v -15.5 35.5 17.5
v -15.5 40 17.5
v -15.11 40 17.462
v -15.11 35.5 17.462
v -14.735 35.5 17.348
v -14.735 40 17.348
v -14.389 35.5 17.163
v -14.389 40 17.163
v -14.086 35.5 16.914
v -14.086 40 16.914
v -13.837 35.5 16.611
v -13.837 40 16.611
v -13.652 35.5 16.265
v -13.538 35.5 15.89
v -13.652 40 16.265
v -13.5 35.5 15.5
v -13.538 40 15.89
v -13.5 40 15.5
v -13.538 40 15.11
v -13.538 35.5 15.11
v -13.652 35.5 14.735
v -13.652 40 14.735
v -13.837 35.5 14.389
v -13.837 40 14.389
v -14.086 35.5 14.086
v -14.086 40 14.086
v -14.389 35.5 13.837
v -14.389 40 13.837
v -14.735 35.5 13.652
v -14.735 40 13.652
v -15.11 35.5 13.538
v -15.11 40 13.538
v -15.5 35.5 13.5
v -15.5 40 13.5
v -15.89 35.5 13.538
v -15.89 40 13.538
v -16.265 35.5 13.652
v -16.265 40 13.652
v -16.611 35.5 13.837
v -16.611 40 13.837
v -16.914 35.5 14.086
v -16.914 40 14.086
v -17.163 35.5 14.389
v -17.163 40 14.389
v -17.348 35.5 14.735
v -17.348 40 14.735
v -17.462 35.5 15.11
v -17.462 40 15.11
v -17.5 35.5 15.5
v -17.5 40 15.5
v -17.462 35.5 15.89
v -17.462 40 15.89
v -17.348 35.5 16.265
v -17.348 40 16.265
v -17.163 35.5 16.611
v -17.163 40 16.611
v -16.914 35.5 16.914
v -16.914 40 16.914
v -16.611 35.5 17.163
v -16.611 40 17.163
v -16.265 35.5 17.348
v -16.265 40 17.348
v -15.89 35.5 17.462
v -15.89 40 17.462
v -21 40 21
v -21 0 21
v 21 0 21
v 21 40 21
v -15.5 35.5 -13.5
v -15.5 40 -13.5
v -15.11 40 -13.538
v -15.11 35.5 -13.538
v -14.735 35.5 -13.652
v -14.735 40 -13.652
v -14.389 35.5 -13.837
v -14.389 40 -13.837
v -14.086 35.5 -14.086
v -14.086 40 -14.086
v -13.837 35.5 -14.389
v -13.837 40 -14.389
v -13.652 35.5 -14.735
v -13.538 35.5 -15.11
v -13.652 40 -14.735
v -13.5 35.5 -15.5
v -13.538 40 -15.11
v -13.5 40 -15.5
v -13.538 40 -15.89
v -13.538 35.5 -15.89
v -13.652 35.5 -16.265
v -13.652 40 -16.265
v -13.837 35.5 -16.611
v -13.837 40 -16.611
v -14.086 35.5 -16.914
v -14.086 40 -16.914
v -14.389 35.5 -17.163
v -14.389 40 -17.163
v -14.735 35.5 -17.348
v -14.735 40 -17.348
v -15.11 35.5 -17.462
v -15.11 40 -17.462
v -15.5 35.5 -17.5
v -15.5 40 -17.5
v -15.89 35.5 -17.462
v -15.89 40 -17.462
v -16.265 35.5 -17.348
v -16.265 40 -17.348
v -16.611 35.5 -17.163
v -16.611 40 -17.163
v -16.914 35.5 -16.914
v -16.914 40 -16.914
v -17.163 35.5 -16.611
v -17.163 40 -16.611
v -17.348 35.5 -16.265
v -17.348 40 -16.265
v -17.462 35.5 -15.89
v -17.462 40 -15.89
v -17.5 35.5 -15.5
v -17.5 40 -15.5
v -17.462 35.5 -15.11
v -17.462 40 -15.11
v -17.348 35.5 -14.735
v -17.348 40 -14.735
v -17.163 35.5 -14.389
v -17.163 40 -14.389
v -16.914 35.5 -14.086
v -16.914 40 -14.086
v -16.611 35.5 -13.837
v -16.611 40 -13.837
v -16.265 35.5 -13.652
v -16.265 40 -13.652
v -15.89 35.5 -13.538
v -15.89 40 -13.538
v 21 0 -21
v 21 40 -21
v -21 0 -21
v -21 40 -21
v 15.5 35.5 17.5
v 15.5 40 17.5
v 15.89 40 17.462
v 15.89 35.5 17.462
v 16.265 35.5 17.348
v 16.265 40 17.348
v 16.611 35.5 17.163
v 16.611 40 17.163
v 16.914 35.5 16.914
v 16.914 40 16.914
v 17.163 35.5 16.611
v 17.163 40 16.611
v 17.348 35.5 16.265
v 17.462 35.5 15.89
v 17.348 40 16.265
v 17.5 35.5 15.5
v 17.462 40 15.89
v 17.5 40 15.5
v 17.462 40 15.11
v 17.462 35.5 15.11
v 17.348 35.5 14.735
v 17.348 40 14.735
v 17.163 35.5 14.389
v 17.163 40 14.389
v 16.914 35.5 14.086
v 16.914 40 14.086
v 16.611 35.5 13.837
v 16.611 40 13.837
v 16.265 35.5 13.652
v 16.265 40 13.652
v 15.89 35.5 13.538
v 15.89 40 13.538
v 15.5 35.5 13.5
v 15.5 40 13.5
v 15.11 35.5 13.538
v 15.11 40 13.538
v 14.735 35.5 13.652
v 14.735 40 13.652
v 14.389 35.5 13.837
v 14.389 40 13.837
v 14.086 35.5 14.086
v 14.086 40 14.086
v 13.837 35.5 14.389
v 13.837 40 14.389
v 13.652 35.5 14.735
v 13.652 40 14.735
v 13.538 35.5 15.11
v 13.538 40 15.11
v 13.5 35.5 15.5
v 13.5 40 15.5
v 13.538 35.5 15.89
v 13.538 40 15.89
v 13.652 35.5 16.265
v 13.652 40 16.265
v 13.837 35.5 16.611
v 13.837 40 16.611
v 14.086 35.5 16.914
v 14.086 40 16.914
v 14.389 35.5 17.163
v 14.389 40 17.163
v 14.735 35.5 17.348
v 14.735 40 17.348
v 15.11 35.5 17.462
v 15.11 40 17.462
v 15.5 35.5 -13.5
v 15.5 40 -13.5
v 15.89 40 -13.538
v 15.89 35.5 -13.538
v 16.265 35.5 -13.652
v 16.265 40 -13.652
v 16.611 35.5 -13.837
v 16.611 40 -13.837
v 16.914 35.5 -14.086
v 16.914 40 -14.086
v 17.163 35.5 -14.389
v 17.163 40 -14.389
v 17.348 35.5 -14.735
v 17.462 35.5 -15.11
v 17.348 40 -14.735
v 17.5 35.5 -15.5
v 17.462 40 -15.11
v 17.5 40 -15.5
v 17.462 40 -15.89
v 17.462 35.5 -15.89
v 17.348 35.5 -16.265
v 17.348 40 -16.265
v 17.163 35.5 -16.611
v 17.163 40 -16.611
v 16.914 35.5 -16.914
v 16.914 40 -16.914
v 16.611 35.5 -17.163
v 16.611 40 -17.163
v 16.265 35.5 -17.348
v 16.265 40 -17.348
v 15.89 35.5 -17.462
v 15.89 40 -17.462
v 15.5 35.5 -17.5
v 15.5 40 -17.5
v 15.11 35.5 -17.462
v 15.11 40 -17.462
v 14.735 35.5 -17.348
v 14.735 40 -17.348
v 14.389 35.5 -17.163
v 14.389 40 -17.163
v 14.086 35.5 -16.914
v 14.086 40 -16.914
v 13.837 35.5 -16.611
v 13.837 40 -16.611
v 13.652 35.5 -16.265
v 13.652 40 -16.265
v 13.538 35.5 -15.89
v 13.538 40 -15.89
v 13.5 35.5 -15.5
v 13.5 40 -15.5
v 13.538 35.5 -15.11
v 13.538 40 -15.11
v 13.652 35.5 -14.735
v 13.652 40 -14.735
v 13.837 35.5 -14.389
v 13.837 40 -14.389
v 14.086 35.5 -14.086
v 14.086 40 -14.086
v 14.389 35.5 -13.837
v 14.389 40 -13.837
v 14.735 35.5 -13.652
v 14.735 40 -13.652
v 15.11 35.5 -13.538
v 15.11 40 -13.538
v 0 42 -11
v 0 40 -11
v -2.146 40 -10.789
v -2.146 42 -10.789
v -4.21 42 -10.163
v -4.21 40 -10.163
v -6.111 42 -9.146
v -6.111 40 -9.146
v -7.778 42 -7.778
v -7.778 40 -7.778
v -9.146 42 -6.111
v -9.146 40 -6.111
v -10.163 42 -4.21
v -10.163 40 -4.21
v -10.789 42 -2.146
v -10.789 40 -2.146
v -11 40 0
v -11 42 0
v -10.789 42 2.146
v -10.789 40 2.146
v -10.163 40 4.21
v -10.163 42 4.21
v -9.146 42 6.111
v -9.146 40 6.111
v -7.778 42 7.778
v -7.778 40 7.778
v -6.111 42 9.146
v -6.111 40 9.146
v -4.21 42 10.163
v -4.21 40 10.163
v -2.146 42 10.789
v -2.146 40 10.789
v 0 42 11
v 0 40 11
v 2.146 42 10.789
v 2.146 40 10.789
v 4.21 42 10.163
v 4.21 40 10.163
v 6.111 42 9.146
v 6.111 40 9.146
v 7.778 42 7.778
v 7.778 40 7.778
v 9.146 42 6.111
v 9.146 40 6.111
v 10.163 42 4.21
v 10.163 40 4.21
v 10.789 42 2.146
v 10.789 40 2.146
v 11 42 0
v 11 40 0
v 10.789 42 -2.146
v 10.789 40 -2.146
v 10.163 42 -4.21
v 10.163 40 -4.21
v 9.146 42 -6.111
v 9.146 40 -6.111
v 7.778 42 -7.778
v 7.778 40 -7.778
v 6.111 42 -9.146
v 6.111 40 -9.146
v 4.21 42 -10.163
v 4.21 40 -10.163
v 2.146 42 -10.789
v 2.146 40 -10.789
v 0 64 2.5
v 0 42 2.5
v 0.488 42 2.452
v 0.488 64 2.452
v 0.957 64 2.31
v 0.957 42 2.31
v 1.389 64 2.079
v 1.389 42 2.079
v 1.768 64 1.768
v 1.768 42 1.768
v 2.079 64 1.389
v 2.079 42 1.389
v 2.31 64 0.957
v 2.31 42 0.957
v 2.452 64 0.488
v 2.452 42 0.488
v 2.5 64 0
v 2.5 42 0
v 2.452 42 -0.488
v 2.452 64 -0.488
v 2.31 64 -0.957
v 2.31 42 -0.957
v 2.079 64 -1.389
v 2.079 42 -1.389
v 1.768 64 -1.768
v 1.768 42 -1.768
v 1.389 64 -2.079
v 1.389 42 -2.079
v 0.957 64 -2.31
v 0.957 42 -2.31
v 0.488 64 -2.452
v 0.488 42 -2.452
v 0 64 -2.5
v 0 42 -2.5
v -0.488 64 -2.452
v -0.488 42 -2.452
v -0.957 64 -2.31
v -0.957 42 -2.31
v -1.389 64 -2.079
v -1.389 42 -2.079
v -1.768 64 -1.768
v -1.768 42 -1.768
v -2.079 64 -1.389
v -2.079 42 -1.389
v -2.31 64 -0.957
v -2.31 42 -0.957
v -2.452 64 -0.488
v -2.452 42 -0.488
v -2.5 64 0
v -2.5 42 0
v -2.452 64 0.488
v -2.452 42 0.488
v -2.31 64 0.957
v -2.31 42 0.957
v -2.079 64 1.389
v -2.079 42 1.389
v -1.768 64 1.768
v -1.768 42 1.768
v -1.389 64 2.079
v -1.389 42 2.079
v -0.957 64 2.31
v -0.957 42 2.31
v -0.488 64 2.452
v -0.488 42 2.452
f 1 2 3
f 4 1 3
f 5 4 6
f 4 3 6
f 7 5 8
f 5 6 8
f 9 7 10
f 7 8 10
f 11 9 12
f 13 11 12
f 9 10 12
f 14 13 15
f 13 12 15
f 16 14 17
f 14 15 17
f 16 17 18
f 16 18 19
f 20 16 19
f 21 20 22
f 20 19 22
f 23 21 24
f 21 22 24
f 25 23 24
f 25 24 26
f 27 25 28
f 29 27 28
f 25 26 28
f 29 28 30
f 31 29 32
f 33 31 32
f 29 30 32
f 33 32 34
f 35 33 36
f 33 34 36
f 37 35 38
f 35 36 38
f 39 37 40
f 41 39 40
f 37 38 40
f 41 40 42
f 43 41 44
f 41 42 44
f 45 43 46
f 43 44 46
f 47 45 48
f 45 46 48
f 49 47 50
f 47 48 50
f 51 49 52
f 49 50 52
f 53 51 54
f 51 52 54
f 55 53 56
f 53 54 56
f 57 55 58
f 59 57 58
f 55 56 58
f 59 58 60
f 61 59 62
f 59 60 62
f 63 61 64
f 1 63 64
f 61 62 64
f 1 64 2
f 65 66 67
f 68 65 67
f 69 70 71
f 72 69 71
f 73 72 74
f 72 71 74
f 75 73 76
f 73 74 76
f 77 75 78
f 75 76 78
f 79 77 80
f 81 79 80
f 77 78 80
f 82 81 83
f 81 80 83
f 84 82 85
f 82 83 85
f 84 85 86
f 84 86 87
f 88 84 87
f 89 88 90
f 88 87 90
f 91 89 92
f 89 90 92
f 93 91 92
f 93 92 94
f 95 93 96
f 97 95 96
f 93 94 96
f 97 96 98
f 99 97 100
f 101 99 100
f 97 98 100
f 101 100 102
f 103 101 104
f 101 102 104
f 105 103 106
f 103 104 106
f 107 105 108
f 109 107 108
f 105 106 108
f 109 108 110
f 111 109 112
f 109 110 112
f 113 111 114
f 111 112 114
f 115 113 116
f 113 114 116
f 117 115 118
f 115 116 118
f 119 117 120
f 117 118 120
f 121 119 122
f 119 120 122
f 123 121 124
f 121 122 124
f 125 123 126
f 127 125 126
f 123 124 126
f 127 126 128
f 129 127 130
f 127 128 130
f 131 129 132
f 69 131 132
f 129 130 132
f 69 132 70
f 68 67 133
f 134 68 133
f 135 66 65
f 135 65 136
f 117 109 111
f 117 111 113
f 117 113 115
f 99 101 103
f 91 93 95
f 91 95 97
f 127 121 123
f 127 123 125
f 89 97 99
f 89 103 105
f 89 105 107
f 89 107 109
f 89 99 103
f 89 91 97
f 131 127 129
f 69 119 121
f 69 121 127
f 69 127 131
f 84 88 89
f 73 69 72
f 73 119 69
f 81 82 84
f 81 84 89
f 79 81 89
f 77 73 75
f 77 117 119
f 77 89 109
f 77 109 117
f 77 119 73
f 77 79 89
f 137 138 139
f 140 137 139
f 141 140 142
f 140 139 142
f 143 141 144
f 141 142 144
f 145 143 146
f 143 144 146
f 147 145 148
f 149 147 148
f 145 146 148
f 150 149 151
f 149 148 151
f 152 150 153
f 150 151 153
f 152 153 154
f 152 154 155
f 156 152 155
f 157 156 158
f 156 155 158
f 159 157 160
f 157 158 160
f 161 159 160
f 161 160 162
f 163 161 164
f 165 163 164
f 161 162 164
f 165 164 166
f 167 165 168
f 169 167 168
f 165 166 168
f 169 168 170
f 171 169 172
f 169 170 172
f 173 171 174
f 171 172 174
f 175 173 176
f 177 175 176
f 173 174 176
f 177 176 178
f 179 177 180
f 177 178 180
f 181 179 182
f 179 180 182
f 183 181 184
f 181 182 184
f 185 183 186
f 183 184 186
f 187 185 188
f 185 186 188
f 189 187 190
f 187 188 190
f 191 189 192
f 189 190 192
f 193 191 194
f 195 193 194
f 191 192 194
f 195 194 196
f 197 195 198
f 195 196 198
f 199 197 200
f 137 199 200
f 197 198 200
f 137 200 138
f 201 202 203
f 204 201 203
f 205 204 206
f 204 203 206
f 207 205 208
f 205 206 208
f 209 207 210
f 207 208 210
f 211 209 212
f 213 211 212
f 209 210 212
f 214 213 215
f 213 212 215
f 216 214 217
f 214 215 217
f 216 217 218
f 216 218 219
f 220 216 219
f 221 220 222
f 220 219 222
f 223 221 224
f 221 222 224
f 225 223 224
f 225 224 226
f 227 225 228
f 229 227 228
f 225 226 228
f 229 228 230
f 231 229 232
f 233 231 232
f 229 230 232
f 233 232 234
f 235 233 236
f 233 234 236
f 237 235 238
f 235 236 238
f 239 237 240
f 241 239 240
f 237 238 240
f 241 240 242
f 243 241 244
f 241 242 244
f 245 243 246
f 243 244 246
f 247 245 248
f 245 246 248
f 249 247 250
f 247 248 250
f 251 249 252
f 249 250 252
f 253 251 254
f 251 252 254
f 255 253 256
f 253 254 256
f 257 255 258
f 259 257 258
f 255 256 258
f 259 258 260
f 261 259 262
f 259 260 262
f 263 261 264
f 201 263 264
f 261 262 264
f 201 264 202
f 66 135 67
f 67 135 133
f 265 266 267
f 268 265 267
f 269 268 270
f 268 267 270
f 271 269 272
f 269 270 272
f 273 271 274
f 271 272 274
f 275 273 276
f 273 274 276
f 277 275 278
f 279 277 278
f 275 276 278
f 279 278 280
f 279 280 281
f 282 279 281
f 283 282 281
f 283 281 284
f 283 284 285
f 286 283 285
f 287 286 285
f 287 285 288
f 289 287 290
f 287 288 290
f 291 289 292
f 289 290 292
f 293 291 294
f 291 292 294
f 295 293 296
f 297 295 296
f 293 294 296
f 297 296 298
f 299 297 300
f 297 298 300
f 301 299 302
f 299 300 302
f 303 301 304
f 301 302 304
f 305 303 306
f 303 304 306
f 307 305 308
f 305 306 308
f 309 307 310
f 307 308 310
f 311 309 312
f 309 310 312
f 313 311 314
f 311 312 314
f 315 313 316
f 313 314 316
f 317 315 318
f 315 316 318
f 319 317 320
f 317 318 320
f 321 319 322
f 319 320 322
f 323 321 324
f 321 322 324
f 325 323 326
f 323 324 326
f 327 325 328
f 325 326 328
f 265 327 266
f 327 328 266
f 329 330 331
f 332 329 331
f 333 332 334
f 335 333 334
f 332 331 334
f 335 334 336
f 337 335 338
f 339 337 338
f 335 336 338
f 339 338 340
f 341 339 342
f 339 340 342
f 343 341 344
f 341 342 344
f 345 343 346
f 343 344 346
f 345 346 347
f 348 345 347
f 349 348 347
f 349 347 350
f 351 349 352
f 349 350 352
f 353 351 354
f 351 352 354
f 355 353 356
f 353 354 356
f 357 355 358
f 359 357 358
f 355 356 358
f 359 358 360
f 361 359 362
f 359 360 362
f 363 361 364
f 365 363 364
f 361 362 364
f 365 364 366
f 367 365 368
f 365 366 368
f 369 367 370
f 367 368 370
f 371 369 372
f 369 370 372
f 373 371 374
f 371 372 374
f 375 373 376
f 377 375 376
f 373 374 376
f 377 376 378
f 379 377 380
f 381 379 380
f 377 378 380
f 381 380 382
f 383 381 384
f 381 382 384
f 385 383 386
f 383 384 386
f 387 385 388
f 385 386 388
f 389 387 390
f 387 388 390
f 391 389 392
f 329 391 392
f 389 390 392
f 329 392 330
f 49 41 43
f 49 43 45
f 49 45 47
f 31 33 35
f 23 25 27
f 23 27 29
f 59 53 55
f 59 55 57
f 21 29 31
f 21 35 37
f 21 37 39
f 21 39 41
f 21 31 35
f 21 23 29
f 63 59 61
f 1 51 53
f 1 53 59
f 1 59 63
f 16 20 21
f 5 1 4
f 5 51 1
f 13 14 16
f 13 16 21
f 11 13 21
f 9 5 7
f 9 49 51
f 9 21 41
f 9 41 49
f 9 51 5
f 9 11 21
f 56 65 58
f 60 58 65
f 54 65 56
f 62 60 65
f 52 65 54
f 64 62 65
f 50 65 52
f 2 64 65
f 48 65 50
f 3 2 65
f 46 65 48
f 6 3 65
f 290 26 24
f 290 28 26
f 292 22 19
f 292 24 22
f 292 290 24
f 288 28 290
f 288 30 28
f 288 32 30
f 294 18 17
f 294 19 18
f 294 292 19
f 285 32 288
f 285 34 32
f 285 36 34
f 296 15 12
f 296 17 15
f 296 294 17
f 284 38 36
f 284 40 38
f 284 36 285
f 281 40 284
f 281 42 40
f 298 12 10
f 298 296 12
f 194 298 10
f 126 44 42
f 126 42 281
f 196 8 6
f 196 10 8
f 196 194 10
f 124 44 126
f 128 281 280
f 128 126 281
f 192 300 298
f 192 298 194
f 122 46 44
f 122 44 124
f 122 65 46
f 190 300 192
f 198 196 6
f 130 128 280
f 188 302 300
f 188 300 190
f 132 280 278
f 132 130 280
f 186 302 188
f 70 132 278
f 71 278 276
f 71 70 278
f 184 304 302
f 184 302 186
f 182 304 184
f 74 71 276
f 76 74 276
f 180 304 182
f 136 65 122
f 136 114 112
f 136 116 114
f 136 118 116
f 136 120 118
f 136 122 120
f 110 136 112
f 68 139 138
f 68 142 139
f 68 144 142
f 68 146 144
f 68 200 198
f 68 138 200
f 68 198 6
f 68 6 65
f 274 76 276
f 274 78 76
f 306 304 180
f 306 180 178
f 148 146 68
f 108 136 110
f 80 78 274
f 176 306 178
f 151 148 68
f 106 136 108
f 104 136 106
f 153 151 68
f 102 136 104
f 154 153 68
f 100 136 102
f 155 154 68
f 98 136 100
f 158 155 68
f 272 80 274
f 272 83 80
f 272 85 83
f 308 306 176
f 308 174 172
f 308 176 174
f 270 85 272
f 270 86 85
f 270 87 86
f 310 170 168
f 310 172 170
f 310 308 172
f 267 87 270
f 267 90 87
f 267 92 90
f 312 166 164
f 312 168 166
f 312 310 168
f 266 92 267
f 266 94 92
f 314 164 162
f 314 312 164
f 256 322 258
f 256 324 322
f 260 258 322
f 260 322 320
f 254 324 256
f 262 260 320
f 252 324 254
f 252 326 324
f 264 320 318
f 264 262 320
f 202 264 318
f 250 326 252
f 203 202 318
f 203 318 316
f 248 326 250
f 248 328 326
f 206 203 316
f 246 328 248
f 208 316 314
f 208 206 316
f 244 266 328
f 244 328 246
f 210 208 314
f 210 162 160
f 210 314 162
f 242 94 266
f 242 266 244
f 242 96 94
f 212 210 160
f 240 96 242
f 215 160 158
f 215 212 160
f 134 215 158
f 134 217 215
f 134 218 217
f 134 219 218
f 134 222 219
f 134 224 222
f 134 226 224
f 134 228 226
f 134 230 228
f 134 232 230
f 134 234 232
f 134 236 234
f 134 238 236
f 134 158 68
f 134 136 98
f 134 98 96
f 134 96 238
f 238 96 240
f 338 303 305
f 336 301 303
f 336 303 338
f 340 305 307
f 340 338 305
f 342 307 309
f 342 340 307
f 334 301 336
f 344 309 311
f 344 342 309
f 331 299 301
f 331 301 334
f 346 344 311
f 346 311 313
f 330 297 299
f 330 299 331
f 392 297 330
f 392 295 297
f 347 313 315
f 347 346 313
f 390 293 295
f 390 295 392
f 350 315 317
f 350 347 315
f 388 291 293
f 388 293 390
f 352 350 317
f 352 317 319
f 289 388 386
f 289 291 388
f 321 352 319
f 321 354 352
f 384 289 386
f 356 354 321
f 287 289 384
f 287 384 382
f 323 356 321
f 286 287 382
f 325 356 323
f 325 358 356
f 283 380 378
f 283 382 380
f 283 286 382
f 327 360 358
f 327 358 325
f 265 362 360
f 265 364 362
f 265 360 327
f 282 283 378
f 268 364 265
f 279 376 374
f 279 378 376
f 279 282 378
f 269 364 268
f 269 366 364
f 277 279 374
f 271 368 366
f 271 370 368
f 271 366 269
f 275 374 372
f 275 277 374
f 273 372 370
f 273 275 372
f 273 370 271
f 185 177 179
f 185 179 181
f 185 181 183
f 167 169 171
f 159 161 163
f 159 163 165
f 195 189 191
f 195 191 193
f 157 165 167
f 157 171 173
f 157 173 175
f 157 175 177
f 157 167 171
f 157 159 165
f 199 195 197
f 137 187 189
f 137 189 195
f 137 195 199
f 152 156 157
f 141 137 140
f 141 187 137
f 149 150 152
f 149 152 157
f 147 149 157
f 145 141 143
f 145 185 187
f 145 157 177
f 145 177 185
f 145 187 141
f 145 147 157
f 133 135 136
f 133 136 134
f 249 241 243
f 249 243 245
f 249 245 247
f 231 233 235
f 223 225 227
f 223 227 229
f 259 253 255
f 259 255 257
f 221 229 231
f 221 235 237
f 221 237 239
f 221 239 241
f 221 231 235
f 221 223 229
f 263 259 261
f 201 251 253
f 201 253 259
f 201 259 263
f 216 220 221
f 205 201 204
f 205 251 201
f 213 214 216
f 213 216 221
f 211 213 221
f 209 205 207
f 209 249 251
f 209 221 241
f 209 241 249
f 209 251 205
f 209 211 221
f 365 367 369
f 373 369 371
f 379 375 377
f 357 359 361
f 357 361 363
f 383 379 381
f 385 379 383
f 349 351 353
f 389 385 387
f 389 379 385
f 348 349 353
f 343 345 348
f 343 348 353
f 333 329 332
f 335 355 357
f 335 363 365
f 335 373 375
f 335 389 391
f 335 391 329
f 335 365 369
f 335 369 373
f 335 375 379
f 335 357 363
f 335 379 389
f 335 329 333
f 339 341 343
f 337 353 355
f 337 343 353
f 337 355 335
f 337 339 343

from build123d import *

# Parameters (mm, degrees)
SKETCH1_W           = 42
SKETCH1_H           = 42
BOSS_EXTRUDE1_DEPTH = 40
SKETCH4_R           = 2
CUT_EXTRUDE1_DEPTH  = 4.5
SKETCH2_R           = 11
BOSS_EXTRUDE2_DEPTH = 2
SKETCH3_R           = 2.5
BOSS_EXTRUDE3_DEPTH = 22


with BuildPart() as part:
    # Sketch1 → Boss-Extrude1 (new body)
    with BuildSketch(Plane(origin=(0, 0, 0), x_dir=(1, 0, 0), z_dir=(0, 1, 0))):
        Rectangle(SKETCH1_W, SKETCH1_H)
    extrude(amount=BOSS_EXTRUDE1_DEPTH)

    # Sketch4 → Cut-Extrude1 (cut)
    with BuildSketch(Plane(origin=(0, 40, 0), x_dir=(1, 0, 0), z_dir=(0, 1, 0))):
        with Locations(Location((-15.5, 15.5, 0), (0, 0, 270))):
            Circle(SKETCH4_R)
        with Locations(Location((15.5, 15.5, 0), (0, 0, 270))):
            Circle(SKETCH4_R)
        with Locations(Location((-15.5, -15.5, 0), (0, 0, 270))):
            Circle(SKETCH4_R)
        with Locations(Location((15.5, -15.5, 0), (0, 0, 270))):
            Circle(SKETCH4_R)
    extrude(amount=-CUT_EXTRUDE1_DEPTH, mode=Mode.SUBTRACT)

    # Sketch2 → Boss-Extrude2 (add)
    with BuildSketch(Plane(origin=(0, 40, 0), x_dir=(1, 0, 0), z_dir=(0, 1, 0))):
        with Locations(Location((0, 0, 0), (0, 0, 90))):
            Circle(SKETCH2_R)
    extrude(amount=BOSS_EXTRUDE2_DEPTH)

    # Sketch3 → Boss-Extrude3 (add)
    with BuildSketch(Plane(origin=(0, 42, 0), x_dir=(1, 0, 0), z_dir=(0, 1, 0))):
        with Locations(Location((0, 0, 0), (0, 0, 270))):
            Circle(SKETCH3_R)
    extrude(amount=BOSS_EXTRUDE3_DEPTH)


solid = part.part
